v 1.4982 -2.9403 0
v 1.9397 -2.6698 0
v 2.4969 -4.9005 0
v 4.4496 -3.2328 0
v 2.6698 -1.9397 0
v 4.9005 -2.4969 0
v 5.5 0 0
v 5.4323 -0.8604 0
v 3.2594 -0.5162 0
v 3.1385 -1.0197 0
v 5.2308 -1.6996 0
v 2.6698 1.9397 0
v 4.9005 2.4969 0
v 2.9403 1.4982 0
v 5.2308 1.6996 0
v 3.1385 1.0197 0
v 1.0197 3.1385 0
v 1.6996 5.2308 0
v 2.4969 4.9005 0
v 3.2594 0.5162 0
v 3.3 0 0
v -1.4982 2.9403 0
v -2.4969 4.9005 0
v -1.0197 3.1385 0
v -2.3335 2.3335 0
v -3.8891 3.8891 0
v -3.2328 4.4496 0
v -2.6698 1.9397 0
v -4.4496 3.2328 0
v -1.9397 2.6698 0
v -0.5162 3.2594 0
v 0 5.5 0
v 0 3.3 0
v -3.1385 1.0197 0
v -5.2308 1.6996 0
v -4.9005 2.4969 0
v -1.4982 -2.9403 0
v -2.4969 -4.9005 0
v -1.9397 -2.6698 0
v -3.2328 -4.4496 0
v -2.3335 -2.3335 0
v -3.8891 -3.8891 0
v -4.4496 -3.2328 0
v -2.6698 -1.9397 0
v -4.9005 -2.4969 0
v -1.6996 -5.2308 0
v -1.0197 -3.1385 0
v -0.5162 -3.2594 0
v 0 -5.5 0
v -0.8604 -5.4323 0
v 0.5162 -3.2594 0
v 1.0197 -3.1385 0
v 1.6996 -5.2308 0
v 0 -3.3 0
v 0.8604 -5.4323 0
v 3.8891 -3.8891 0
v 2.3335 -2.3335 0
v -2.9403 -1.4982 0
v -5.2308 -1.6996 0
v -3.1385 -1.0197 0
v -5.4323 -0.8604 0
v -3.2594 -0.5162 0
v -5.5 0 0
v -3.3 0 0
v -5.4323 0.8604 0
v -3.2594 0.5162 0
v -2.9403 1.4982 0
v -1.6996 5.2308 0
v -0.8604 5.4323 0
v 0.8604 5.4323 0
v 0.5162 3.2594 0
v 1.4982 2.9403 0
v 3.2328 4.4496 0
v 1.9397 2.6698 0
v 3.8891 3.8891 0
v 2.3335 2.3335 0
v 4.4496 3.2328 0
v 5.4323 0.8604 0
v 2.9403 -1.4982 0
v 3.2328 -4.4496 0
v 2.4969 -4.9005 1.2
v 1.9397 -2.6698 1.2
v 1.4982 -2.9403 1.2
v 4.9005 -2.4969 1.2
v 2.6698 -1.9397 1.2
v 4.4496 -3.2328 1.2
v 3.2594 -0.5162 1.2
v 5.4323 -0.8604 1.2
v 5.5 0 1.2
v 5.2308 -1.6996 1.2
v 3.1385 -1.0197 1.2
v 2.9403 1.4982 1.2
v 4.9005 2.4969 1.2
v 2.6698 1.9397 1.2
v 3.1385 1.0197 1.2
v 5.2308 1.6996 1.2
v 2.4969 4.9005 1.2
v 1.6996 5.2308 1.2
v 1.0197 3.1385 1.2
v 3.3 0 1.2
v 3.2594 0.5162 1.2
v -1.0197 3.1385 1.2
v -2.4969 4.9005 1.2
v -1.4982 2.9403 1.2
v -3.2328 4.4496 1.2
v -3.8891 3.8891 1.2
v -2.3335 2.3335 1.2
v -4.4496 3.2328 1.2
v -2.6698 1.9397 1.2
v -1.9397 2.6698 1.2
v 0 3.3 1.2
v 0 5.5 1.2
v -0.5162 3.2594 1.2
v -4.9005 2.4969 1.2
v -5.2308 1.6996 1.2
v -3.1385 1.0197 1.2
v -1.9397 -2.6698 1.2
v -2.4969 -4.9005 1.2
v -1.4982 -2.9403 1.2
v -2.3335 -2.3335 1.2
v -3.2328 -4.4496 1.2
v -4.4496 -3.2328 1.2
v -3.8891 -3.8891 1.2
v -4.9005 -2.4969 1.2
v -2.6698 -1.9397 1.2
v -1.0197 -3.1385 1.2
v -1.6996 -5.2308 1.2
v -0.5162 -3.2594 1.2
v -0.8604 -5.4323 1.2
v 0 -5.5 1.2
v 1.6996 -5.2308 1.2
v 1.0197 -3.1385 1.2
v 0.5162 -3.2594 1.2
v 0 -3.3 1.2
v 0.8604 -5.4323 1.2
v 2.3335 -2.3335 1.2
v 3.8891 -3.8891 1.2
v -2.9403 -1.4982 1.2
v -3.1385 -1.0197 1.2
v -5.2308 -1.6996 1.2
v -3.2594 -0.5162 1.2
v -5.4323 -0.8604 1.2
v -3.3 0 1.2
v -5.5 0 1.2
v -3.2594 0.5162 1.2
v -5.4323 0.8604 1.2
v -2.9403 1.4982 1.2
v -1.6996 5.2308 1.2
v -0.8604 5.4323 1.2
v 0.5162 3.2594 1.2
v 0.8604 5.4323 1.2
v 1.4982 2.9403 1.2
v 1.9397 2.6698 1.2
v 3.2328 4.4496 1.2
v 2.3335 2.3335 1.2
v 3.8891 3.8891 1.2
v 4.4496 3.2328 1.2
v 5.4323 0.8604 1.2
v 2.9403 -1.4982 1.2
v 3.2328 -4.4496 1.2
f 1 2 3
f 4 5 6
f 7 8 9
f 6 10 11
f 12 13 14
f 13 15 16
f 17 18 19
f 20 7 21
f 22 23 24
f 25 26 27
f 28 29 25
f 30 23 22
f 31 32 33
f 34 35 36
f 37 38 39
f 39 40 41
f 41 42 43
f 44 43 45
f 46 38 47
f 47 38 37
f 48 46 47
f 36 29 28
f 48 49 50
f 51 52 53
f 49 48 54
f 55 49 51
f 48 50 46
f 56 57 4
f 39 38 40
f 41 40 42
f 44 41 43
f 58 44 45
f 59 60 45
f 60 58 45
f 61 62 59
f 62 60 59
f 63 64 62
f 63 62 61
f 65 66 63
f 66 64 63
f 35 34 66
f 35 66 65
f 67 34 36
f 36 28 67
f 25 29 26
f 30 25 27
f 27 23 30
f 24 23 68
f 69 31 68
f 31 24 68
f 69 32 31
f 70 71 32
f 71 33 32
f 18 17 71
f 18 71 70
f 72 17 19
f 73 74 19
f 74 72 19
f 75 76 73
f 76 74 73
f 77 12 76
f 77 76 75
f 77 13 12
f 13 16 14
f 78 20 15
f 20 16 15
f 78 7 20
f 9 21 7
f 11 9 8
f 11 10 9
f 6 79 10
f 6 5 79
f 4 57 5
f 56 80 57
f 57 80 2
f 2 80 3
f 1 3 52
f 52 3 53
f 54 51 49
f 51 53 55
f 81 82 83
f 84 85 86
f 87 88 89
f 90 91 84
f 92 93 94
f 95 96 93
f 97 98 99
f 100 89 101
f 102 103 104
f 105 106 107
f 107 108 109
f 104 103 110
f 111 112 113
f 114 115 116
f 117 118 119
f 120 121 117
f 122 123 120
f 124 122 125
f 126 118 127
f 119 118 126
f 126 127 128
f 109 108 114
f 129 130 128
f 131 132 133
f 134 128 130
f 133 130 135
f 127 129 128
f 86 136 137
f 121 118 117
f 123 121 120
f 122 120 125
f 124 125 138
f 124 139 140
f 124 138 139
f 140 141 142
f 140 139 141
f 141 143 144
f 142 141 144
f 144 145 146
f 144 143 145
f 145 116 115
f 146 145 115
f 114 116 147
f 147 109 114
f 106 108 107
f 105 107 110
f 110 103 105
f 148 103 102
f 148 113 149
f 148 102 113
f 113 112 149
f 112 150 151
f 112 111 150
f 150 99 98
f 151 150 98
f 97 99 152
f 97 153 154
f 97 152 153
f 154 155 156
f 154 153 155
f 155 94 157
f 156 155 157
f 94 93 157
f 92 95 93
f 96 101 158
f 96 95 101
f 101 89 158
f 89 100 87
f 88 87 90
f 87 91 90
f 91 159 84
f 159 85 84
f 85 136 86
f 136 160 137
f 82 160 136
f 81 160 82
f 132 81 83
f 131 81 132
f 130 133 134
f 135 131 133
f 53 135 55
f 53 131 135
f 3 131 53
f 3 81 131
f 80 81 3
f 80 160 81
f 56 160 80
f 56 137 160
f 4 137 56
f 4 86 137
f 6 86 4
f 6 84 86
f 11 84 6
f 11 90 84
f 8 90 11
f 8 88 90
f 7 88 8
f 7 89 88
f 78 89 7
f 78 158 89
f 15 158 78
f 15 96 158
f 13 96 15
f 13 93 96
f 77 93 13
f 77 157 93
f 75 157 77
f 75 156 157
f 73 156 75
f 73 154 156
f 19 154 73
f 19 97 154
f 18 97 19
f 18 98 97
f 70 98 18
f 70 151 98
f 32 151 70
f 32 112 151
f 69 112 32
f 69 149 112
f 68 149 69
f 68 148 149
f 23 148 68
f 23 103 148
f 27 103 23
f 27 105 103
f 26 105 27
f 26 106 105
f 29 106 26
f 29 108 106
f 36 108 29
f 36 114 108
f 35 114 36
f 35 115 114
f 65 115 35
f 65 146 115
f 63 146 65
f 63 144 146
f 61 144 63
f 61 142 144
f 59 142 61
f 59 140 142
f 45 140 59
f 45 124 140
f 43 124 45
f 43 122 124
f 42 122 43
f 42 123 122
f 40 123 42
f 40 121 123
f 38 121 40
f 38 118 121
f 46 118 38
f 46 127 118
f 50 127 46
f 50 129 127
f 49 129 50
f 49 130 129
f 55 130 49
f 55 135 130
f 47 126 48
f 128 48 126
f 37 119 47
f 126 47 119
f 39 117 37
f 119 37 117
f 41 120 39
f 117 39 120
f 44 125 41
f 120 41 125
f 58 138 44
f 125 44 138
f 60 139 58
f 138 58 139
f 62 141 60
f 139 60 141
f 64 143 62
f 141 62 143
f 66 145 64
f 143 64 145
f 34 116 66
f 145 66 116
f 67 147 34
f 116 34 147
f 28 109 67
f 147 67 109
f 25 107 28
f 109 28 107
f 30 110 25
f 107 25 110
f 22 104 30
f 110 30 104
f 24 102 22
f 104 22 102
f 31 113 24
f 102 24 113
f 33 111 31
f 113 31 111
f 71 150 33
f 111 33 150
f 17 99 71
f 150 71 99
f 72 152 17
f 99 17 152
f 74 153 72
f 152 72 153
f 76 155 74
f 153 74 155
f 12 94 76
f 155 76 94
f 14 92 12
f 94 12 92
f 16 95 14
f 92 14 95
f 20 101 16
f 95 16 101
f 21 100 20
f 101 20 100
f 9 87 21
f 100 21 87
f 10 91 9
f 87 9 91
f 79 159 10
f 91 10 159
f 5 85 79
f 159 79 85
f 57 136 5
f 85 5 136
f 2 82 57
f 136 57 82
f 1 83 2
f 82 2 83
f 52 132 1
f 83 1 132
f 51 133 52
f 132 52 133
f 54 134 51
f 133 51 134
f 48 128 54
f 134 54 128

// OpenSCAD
include <../lib/kobo-meshcore-case-lib.scad>;
$fn = 40;
sma_washer();
